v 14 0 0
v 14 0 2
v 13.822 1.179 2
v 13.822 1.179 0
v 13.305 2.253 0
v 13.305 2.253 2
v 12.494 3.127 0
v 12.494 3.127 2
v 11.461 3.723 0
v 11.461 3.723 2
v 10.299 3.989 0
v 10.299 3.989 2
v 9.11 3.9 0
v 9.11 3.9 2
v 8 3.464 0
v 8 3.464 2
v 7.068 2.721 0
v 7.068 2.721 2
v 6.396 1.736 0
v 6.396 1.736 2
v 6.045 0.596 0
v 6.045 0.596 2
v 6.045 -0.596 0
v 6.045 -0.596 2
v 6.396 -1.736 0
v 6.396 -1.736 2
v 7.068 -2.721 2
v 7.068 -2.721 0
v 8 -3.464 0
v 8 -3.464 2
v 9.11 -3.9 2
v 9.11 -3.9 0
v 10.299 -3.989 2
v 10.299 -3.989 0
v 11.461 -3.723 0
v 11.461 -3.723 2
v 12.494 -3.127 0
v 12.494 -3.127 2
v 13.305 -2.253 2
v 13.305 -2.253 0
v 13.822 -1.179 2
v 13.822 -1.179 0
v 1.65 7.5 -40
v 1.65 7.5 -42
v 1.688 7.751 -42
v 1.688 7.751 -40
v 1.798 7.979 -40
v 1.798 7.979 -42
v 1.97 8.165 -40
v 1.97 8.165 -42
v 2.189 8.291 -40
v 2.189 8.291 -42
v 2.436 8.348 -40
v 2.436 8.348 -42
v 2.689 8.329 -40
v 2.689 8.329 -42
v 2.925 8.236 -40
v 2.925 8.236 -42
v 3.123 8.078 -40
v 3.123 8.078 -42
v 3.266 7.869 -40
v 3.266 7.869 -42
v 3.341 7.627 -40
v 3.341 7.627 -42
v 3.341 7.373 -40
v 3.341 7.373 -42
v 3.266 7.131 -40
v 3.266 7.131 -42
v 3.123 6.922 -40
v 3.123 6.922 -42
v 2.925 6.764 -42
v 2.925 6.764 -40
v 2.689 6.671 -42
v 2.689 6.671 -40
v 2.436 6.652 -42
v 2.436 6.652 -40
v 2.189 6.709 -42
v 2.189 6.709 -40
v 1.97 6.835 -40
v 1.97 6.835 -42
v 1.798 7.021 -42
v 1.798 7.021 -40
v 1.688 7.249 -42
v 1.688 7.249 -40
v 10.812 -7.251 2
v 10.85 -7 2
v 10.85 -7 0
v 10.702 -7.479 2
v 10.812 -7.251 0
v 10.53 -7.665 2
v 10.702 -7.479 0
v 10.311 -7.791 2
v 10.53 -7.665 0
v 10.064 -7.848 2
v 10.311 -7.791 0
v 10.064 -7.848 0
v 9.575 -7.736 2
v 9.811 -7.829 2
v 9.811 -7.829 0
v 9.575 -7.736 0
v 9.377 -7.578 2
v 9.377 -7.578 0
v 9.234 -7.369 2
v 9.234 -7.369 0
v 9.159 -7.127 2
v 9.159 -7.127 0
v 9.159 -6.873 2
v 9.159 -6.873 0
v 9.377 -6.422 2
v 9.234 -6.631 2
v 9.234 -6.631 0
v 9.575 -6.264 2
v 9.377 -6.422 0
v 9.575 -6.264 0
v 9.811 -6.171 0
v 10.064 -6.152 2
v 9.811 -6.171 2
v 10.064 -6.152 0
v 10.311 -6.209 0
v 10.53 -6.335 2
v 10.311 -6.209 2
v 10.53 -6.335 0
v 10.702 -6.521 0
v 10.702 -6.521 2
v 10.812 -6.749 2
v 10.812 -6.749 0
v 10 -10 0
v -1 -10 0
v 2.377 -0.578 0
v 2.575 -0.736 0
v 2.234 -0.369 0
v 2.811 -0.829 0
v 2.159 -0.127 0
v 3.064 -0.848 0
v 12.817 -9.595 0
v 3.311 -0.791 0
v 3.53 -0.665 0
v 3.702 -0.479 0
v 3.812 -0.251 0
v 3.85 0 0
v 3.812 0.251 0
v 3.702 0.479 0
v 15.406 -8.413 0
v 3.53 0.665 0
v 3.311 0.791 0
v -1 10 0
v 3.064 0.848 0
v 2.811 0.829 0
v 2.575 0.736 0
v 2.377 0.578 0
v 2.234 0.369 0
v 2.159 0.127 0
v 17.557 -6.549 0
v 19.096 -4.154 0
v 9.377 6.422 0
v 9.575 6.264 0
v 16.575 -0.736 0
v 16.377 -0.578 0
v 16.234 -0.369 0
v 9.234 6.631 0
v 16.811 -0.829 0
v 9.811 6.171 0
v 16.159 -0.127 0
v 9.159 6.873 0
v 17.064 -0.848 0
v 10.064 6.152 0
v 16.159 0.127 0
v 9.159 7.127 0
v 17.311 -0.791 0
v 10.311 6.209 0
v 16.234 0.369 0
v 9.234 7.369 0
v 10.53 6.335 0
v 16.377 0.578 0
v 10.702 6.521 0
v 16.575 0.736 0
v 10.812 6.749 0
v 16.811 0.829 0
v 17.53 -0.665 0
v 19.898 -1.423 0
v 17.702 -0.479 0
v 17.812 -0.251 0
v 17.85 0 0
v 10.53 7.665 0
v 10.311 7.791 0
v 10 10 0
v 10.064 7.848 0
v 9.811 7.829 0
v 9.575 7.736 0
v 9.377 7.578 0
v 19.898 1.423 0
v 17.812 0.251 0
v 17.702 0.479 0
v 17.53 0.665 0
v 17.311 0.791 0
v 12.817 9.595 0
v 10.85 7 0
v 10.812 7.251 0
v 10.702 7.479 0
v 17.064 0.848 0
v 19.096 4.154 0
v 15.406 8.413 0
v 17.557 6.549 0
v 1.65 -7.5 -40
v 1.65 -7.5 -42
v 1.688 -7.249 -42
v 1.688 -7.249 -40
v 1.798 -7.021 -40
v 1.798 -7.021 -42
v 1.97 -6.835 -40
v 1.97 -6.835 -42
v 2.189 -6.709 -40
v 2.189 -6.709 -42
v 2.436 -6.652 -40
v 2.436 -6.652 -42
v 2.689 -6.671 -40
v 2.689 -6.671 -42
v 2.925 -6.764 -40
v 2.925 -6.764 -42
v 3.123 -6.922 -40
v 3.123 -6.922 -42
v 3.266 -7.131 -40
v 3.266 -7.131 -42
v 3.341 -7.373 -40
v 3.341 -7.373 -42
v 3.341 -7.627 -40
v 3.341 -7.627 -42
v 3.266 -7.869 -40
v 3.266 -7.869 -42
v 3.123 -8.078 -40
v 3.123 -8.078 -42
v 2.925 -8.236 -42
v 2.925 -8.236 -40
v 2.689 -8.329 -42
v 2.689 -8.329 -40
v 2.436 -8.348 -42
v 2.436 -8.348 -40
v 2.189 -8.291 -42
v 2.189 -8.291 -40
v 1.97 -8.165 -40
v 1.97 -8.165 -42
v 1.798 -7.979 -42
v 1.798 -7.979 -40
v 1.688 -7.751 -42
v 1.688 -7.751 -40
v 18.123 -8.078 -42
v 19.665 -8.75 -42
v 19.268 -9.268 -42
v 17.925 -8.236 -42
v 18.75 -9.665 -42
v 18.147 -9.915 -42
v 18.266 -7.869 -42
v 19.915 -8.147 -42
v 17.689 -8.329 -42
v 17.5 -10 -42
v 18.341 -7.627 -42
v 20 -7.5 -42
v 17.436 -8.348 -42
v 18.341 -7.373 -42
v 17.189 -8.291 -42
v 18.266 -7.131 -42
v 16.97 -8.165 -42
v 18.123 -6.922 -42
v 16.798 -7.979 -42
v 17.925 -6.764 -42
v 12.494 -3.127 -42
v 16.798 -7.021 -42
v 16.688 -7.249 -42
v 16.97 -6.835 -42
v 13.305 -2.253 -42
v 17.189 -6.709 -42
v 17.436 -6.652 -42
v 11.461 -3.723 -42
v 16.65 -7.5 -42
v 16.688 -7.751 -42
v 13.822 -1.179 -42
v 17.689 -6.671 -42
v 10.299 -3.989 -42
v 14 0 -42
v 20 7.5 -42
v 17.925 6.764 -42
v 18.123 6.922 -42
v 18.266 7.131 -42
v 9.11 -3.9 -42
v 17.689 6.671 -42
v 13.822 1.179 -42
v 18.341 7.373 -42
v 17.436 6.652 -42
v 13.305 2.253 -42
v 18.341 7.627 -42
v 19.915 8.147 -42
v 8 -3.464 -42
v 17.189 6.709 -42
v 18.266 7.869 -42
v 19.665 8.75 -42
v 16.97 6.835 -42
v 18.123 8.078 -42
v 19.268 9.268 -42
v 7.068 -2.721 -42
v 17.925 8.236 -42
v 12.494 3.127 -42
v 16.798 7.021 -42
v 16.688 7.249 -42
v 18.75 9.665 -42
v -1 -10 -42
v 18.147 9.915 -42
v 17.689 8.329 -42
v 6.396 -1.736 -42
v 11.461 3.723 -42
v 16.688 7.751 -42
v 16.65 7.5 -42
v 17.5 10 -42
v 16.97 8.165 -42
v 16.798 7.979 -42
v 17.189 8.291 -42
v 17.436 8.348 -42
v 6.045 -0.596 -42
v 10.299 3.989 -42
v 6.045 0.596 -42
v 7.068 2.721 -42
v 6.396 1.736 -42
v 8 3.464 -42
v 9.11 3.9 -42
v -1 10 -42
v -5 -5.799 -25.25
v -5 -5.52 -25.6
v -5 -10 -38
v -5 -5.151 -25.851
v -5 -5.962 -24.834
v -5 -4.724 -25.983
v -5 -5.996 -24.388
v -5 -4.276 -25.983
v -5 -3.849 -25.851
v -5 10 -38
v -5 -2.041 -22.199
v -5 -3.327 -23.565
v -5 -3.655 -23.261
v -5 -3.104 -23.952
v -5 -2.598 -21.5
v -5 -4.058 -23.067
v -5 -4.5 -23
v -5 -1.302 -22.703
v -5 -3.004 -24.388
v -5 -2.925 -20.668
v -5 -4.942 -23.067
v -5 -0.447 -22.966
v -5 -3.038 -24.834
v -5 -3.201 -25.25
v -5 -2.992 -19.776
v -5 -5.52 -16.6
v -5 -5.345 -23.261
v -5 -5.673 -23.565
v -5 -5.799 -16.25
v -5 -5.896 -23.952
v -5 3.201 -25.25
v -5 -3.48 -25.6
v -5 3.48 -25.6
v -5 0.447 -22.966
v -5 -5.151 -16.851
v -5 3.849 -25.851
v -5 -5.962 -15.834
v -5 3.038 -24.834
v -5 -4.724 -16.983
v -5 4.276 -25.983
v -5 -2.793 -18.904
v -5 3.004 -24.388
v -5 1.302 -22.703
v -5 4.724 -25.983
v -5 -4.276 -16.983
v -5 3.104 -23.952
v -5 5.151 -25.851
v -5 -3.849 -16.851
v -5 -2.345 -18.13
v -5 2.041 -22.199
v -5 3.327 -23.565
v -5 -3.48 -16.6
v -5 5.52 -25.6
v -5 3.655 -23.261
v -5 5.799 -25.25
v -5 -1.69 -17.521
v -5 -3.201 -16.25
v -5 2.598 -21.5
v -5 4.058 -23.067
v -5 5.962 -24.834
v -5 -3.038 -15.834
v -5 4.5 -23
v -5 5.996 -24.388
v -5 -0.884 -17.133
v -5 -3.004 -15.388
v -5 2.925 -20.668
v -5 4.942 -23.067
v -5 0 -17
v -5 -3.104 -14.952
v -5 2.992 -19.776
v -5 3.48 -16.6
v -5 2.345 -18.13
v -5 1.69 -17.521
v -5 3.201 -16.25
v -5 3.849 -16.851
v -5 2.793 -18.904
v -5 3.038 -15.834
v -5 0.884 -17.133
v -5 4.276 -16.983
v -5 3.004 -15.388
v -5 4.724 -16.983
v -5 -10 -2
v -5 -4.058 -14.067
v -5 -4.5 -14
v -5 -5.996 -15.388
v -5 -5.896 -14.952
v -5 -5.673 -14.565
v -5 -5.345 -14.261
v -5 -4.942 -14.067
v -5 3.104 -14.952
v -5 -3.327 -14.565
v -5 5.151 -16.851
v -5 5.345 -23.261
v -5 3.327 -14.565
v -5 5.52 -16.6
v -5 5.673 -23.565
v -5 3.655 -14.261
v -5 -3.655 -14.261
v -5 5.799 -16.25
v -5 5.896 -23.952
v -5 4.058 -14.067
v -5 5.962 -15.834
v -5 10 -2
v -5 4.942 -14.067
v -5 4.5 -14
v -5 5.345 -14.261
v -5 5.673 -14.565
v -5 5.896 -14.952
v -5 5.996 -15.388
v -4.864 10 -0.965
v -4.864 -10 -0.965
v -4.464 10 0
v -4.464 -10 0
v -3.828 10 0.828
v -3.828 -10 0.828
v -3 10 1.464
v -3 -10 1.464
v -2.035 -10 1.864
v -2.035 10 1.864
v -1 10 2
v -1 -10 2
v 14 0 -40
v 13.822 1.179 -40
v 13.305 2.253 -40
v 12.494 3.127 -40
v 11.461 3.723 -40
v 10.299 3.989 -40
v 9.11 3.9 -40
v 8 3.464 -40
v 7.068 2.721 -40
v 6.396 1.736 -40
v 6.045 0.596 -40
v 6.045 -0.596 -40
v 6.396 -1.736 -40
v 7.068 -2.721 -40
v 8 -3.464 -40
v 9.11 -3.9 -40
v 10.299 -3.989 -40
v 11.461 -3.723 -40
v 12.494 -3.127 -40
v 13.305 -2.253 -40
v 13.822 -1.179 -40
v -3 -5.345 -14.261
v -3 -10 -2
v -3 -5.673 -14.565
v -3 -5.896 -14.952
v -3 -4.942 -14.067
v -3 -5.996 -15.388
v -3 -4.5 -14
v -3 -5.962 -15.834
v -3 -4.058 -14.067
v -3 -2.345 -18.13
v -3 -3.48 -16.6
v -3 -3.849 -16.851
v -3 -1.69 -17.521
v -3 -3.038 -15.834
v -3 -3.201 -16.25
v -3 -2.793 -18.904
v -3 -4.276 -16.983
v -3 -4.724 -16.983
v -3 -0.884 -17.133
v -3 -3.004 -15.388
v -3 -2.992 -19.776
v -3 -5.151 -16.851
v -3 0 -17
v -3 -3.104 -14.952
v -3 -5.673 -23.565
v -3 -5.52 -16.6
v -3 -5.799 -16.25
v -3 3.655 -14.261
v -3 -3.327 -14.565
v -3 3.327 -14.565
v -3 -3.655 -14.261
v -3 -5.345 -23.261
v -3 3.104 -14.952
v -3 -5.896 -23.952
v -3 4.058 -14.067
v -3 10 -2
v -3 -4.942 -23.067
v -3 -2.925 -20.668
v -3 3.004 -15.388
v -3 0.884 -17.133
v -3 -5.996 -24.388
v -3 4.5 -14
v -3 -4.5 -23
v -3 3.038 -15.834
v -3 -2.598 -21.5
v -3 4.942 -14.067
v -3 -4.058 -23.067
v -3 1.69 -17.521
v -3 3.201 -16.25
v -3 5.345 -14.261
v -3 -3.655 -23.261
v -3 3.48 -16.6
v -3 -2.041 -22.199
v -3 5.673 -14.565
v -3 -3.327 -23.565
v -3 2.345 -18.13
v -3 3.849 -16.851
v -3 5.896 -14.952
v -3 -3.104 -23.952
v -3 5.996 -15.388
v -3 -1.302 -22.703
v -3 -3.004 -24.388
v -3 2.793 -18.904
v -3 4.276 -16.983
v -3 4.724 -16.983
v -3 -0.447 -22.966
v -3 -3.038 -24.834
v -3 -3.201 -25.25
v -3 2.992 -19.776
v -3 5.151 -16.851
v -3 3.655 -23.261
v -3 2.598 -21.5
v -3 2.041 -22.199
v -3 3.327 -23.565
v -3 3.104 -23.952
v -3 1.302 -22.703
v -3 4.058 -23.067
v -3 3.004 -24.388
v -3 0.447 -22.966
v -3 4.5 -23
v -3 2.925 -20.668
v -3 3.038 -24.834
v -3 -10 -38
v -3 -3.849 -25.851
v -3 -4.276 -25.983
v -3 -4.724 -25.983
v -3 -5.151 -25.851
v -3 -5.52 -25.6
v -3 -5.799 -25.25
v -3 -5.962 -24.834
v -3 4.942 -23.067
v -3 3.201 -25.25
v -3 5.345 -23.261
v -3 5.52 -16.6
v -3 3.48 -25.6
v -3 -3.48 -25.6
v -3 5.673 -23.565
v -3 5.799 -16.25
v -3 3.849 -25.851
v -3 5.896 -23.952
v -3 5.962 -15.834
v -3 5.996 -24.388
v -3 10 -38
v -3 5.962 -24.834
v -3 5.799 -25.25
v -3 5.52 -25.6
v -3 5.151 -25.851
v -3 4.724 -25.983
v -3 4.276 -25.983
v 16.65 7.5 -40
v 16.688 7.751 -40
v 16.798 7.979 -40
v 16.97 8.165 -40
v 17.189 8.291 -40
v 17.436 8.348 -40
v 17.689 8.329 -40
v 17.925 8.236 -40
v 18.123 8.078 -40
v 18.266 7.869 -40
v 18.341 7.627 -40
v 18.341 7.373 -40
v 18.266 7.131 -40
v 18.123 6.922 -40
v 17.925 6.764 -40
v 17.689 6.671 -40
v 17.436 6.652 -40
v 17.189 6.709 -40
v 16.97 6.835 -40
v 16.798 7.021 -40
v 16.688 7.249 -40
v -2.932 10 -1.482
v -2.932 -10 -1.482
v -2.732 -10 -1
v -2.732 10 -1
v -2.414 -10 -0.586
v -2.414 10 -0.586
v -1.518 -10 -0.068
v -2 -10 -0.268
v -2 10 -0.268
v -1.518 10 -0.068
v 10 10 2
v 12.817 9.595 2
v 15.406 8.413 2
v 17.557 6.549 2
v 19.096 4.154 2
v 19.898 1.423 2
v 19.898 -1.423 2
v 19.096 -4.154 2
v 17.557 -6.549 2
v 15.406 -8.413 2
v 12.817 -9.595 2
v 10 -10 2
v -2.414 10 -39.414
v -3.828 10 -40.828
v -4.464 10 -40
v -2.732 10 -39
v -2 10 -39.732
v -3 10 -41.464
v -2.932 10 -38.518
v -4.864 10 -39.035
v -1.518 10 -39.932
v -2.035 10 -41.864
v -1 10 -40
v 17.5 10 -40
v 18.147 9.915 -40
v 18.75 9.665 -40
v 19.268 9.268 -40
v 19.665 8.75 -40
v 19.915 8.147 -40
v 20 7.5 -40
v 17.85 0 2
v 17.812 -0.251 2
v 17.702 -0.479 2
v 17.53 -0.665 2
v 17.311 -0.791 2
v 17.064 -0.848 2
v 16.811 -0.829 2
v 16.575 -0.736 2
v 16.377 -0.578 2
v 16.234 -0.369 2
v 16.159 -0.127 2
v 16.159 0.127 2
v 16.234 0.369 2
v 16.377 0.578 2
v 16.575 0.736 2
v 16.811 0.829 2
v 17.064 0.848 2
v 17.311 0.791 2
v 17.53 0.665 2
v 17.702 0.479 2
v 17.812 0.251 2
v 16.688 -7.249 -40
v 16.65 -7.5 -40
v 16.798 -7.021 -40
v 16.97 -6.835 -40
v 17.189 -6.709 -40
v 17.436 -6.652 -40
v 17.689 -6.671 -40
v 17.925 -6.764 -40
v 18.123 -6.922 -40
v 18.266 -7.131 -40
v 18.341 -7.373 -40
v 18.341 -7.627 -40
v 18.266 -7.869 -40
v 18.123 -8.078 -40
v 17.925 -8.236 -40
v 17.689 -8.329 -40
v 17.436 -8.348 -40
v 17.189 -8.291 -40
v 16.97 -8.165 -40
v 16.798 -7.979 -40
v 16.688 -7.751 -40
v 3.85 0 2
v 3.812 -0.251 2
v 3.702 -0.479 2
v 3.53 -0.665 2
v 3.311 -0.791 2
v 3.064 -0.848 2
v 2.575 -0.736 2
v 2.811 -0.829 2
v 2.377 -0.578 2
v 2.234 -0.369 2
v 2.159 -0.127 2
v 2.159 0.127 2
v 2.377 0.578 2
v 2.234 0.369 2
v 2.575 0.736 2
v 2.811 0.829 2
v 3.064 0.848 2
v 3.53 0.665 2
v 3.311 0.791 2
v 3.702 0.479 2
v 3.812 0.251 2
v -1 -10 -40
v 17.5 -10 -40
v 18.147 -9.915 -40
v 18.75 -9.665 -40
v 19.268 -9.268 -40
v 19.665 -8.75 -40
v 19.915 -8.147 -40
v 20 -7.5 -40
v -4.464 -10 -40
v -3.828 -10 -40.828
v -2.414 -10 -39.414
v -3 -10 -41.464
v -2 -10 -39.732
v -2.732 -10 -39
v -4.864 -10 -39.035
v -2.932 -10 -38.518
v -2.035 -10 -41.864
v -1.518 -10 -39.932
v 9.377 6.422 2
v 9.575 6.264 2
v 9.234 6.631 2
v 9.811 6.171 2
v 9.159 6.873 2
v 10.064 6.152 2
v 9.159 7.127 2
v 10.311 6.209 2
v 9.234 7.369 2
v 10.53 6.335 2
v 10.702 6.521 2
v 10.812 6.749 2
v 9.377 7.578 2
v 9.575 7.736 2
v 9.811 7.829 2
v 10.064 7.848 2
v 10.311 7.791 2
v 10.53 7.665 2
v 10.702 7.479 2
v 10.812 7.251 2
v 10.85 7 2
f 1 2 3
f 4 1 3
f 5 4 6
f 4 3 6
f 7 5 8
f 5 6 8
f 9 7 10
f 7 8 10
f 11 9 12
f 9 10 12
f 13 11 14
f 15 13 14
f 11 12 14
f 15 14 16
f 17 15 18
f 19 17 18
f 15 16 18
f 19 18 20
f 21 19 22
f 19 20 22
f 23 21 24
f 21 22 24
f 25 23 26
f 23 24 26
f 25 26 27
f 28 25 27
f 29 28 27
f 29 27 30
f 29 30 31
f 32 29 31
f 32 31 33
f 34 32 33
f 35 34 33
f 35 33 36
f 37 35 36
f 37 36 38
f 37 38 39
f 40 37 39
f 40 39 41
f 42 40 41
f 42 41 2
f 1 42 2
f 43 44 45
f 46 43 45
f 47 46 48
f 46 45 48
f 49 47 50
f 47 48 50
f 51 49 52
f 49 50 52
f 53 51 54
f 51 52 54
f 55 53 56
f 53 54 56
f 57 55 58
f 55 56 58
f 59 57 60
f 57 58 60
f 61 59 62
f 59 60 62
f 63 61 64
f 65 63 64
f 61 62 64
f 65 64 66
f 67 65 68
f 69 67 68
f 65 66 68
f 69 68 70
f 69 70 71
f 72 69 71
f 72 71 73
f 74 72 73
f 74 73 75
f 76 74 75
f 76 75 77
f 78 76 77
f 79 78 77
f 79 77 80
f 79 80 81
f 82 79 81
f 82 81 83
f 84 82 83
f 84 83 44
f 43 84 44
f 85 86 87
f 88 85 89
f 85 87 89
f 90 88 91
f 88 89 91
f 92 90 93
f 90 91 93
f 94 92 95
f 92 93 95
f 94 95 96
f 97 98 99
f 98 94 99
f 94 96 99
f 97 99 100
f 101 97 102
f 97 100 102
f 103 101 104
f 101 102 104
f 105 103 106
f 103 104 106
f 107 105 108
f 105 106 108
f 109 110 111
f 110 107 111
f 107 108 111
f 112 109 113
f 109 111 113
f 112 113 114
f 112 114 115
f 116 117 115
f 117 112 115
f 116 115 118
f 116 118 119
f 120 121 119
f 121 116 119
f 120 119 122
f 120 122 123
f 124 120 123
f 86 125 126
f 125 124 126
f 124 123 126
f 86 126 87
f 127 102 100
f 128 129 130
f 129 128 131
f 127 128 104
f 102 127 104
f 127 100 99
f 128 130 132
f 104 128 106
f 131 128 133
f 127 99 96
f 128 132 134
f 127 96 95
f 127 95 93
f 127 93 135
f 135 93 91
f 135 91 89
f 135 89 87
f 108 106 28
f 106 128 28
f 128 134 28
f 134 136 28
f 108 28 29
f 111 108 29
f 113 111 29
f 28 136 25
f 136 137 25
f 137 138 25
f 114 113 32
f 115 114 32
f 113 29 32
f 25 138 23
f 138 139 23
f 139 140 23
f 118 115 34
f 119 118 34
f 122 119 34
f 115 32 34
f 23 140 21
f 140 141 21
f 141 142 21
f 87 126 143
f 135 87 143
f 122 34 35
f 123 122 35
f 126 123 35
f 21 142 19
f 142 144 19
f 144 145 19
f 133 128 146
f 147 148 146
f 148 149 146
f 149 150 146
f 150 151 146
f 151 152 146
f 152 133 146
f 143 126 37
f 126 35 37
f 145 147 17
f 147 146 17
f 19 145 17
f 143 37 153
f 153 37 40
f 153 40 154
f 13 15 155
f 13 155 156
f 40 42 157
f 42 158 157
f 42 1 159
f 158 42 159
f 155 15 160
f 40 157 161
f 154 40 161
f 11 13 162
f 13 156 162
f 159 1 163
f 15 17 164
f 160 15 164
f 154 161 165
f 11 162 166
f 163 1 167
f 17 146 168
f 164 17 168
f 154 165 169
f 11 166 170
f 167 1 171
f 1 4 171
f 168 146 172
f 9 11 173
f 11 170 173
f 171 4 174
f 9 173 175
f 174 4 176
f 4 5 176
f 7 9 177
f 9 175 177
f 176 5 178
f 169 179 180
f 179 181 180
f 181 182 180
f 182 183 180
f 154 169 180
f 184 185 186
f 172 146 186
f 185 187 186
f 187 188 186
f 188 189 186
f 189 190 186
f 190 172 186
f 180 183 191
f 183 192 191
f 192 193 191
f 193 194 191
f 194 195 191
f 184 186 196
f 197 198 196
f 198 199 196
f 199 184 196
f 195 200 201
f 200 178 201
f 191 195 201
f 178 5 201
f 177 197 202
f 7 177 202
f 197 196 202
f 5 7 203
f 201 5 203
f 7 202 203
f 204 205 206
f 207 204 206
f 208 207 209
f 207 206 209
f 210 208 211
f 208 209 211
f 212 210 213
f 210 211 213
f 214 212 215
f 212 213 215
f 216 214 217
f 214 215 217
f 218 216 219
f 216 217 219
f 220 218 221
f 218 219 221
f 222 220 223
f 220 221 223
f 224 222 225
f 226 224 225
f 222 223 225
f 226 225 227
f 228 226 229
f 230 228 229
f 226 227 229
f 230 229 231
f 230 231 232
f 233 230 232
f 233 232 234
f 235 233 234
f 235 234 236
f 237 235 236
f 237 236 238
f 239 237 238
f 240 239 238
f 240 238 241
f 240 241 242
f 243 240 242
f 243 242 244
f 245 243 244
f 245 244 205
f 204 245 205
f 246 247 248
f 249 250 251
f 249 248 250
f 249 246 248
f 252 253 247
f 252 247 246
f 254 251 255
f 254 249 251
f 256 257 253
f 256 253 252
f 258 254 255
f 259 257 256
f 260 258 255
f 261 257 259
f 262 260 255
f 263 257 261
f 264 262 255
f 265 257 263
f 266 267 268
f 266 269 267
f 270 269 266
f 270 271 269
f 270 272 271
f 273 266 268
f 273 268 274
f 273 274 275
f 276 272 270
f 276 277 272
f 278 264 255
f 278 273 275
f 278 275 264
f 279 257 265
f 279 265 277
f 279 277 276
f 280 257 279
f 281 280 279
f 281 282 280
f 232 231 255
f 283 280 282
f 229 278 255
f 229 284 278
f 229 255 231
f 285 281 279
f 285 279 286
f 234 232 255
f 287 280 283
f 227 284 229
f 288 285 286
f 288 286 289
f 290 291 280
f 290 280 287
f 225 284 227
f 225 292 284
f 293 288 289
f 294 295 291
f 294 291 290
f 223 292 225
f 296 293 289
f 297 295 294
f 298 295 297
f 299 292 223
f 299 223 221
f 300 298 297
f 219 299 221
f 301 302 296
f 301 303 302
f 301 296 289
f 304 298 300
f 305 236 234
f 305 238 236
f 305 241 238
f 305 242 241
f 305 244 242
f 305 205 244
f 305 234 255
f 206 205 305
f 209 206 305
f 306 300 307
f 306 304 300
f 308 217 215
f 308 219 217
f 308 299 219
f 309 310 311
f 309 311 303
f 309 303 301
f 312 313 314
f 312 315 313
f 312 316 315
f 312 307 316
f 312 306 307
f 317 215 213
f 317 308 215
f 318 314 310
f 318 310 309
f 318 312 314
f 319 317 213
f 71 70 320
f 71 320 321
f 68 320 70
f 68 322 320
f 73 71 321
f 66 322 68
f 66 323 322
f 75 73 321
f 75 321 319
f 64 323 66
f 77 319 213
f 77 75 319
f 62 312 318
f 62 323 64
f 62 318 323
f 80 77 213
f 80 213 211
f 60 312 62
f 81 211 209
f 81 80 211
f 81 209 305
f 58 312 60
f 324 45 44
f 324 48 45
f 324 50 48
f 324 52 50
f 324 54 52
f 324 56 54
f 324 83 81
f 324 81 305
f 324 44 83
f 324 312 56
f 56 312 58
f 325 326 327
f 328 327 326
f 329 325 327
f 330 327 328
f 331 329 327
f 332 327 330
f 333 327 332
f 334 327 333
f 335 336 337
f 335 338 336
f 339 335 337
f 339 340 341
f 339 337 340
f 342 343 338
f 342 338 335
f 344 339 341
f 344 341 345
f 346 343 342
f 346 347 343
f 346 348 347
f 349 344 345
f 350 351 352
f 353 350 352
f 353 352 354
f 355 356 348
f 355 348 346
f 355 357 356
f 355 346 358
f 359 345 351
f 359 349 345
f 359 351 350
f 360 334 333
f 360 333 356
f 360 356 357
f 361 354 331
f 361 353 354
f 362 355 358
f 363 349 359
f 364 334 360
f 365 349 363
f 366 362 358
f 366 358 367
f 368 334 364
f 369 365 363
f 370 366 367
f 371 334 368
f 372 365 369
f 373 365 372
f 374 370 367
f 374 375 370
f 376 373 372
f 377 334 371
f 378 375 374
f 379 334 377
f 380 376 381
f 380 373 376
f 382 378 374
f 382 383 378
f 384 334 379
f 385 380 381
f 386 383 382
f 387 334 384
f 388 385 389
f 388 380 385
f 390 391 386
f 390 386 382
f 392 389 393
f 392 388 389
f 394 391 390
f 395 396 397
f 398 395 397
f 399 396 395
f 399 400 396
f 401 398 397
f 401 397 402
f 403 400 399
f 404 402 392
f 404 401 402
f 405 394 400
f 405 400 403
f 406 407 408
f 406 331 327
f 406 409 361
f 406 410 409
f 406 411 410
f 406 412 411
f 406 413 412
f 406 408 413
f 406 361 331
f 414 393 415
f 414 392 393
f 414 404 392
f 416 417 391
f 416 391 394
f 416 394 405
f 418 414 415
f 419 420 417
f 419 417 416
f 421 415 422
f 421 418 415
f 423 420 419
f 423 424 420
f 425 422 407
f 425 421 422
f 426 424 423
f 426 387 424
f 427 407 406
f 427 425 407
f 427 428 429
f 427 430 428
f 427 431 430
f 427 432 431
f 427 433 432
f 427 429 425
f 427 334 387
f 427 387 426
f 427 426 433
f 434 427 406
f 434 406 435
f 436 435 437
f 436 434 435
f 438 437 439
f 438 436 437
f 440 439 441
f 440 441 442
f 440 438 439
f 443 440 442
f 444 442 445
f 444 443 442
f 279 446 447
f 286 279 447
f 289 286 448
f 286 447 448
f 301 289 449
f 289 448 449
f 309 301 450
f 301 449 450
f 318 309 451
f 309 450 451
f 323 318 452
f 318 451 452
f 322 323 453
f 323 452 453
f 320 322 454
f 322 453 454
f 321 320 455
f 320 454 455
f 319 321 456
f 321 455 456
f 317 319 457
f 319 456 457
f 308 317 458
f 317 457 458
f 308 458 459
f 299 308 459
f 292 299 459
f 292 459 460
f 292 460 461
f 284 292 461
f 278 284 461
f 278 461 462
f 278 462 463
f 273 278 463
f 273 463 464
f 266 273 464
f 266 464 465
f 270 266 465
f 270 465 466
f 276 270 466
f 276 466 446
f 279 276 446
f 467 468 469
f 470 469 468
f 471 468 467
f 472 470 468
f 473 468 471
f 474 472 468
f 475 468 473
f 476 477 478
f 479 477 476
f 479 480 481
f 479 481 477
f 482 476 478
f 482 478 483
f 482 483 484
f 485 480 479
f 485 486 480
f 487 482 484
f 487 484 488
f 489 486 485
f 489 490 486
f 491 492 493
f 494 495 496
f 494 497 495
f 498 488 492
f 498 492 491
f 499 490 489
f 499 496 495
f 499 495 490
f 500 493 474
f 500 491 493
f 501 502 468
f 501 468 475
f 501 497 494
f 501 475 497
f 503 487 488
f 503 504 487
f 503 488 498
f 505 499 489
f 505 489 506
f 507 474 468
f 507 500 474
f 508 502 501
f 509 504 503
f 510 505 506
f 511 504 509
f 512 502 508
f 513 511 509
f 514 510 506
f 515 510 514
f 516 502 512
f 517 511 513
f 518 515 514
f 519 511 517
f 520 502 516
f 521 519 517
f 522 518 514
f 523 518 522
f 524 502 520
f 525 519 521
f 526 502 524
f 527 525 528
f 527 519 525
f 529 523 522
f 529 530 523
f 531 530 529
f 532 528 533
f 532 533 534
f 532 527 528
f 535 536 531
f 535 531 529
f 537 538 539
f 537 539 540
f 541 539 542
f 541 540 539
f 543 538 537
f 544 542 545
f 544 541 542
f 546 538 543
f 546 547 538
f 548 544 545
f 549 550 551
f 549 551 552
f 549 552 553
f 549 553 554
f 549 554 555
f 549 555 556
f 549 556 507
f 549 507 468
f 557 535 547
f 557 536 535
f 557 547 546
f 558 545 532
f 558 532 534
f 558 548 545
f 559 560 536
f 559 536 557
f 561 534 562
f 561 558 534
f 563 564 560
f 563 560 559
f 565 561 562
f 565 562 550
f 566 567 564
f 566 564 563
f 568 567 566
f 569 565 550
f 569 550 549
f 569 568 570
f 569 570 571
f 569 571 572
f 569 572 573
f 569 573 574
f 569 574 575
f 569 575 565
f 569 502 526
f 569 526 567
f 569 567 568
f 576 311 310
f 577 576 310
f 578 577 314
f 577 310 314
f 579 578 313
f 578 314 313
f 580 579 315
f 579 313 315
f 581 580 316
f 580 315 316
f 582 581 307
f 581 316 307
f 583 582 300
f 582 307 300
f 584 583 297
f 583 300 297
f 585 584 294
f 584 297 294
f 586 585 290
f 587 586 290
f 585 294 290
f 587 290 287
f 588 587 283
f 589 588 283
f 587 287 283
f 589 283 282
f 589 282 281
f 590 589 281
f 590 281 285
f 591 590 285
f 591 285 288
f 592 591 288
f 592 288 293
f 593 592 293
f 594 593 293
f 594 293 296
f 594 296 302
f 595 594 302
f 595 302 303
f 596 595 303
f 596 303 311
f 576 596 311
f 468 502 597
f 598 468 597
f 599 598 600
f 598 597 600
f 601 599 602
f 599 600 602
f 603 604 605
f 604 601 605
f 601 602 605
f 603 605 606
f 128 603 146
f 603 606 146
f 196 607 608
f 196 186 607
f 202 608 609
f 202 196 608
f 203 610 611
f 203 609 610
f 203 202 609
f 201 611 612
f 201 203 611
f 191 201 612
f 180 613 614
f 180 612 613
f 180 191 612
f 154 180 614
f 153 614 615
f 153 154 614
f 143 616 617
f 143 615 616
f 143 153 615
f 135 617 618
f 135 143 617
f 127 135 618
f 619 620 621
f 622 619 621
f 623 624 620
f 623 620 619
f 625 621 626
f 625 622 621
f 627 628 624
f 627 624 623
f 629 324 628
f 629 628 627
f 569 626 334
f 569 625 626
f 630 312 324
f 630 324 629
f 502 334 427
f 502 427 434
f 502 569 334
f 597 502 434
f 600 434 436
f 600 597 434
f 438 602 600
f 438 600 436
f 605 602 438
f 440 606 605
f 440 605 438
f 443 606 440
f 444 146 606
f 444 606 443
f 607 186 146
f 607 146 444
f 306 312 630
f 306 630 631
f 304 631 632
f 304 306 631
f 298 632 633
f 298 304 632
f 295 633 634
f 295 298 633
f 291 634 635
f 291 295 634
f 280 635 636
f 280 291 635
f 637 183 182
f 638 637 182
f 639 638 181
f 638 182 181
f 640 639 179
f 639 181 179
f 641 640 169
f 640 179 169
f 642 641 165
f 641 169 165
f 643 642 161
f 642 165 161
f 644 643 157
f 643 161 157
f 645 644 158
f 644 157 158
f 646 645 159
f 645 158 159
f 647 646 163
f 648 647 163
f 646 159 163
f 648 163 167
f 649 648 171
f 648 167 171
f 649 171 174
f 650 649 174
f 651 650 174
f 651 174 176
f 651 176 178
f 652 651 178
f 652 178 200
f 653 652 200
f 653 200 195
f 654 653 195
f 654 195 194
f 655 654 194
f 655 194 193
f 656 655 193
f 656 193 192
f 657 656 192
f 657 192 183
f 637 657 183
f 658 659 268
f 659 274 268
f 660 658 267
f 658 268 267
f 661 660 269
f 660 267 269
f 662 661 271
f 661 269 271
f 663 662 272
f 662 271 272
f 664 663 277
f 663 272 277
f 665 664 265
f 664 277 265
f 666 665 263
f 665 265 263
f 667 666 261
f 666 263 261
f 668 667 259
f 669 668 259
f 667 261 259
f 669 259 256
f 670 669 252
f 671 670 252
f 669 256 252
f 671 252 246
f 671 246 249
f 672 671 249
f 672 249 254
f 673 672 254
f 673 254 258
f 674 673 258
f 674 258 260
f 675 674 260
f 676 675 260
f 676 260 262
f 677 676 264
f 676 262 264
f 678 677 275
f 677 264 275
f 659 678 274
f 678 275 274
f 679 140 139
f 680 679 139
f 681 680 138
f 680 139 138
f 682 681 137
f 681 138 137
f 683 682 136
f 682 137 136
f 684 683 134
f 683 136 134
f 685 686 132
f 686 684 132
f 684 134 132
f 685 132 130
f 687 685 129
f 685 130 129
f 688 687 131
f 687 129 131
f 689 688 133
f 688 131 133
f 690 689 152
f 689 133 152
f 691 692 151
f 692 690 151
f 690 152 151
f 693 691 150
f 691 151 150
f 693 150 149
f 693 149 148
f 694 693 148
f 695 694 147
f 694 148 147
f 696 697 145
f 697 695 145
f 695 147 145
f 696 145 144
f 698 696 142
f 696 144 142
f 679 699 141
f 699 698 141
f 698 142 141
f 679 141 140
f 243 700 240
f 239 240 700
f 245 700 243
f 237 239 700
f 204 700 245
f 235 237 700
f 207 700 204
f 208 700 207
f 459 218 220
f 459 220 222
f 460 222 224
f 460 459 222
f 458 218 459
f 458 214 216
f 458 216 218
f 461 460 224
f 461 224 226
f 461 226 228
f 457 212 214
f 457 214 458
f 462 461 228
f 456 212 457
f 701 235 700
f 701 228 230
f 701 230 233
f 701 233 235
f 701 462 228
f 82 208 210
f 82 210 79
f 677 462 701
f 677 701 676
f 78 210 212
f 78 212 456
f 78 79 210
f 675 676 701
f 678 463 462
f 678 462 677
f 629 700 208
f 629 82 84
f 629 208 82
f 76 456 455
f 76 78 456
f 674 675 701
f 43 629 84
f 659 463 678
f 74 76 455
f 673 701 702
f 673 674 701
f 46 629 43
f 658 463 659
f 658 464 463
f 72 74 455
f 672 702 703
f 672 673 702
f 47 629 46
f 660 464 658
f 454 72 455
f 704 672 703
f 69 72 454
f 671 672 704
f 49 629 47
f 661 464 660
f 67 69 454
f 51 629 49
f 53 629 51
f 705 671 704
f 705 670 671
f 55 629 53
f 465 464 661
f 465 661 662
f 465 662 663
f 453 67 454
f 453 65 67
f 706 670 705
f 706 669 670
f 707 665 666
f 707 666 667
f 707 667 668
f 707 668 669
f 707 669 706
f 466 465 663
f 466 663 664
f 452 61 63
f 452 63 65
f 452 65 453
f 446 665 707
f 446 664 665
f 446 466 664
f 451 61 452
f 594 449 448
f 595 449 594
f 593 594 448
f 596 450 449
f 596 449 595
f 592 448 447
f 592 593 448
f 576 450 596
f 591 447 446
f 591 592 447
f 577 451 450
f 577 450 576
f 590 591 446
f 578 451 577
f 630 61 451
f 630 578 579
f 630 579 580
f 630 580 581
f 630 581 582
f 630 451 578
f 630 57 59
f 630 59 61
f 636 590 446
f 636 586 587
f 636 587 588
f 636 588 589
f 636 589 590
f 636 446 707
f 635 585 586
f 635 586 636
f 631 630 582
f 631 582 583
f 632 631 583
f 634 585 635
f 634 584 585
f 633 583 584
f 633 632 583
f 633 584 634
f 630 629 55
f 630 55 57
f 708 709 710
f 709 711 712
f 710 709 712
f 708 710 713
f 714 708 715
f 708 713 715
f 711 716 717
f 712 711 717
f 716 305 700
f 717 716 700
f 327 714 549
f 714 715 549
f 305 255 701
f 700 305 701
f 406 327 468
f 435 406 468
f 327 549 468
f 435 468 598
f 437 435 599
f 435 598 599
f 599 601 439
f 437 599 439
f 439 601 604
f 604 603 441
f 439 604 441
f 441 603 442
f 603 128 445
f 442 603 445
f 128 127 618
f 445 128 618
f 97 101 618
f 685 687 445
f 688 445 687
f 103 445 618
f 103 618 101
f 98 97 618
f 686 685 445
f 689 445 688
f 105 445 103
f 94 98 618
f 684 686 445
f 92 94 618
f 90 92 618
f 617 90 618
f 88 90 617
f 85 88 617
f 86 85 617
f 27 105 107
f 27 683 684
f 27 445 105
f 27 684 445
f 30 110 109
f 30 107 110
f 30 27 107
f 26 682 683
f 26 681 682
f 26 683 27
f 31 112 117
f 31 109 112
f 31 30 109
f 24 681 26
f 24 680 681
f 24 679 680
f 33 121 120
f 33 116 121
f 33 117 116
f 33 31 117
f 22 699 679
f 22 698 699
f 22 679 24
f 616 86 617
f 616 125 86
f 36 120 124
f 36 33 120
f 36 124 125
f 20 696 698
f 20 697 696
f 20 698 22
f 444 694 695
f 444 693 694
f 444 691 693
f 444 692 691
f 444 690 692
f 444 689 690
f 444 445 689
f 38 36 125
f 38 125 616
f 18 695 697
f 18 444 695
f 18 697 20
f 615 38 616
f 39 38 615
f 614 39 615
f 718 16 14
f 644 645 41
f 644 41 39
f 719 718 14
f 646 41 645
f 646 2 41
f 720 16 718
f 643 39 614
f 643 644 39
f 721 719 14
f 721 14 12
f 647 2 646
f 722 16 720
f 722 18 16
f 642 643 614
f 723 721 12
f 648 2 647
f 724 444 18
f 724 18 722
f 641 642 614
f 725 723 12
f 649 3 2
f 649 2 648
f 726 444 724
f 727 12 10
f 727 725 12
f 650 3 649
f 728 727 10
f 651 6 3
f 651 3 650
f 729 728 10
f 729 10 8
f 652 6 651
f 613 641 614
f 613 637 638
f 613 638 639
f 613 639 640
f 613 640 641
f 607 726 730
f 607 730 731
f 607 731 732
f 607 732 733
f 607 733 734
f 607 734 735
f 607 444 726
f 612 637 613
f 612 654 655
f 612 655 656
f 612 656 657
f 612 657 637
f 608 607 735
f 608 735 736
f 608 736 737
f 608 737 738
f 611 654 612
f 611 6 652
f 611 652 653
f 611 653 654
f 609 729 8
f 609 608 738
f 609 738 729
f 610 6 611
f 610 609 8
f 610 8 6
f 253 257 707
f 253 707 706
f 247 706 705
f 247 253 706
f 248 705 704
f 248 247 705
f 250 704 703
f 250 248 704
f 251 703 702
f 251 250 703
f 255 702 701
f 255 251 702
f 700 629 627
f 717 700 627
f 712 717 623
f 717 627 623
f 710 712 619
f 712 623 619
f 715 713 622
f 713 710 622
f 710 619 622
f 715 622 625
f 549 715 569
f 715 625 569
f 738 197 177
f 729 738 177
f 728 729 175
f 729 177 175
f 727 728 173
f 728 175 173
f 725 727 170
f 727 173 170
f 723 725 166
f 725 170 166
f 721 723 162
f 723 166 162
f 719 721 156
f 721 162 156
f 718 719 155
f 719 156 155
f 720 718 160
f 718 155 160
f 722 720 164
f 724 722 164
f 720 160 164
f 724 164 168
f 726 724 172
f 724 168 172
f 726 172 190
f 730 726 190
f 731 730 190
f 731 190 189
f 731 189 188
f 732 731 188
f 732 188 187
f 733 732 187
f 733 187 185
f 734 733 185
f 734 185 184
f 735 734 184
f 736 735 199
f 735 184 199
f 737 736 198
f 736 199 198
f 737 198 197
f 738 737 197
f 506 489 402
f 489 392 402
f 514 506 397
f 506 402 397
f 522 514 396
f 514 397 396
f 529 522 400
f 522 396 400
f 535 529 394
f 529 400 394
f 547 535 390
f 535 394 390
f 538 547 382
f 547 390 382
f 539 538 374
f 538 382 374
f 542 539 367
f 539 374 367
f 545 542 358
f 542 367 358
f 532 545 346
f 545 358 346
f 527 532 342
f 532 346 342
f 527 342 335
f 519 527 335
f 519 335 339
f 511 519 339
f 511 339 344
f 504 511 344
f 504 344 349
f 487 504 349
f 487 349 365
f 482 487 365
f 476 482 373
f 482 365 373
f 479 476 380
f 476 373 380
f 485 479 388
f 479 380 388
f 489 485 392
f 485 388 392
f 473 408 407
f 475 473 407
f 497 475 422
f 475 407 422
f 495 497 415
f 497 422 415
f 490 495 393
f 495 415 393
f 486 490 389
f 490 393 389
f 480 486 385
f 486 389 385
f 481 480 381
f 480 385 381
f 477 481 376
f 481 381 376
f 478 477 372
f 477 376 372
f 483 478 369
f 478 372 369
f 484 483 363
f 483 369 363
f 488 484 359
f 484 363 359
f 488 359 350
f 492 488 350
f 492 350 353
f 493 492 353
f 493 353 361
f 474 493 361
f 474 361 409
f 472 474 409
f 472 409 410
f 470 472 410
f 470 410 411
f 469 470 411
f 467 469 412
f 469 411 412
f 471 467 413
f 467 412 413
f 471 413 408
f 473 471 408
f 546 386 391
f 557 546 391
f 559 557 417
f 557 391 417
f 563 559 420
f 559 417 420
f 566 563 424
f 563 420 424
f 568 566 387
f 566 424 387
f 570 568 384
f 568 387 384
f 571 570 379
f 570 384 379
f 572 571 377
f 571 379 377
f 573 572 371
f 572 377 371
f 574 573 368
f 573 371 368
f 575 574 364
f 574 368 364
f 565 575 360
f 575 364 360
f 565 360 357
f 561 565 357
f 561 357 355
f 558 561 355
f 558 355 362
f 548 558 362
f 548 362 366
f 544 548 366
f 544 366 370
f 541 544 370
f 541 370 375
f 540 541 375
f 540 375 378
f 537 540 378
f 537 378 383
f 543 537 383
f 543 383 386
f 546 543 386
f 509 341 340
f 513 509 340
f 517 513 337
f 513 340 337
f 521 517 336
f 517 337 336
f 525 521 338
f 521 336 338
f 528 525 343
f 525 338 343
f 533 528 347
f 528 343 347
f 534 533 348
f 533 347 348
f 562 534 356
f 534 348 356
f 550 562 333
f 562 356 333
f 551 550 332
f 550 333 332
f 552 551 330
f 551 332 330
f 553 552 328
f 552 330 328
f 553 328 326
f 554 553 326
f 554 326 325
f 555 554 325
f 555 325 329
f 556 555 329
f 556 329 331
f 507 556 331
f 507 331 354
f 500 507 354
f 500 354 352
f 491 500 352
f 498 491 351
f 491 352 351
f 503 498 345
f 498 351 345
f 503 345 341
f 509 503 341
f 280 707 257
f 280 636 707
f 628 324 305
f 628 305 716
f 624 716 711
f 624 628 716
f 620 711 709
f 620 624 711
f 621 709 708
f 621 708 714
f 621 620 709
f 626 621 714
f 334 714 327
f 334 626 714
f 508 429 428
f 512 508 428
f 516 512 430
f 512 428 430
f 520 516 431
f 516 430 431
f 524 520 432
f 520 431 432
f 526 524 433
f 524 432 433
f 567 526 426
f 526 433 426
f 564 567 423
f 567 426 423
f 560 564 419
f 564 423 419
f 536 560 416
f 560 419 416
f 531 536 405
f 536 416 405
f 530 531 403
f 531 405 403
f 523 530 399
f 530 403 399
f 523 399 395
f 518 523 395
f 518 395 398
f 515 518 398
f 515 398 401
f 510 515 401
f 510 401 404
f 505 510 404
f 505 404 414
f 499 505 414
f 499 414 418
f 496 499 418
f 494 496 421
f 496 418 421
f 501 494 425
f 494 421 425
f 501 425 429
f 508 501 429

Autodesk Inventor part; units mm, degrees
ref_plane "YZ Plane" through (0, 0, 0) normal (1, 0, 0) x (0, 1, 0)
ref_plane "XZ Plane" through (0, 0, 0) normal (0, 1, 0) x (-1, 0, 0)
ref_plane "XY Plane" through (0, 0, 0) normal (0, 0, 1) x (1, 0, 0)
sketch "Sketch1" plane through (0, 0, 0) normal (0, 0, 1) x (1, 0, 0)
  line L0 (2.5, 10) -> (37.5, 10) construction
  line L1 (0, -7.5) -> (0, 7.5) construction
  line L2 (37.5, -10) -> (2.5, -10) construction
  circle A0 centre (10, -7) radius 0.85
  circle A1 centre (10, 7) radius 0.85
  circle A2 centre (3, 0) radius 0.85
  circle A3 centre (10, 0) radius 10
  line L3 (10, 7) -> (10, -7) construction
  circle A4 centre (17, 0) radius 0.85
  line L4 (10, 10) -> (-5, 10)
  line L5 (-5, 10) -> (-5, -10)
  line L6 (-5, -10) -> (10, -10)
  line L7 (10, -10) -> (10, 10)
  line L8 (10, 0) -> (20, 0)
  point P0 (0, 0)
  dimension "d0" = 25
extrude "Plate1" add sketch "Sketch1" along normal blind 2 contours A0 L7 L8 A4 A3 | A0 L7 A3 A1 | L7 A1 A3 L8 A4 | L6 L5 L4 A3
sketch "Sketch2" plane through (-3, 10, 2) normal (-1, 0, 0) x (0, -1, 0)
  line L0 (20, 0) -> (0, 0)
  line L1 (0, 0) -> (0, -44)
  line L2 (0, -44) -> (20, -44)
  line L3 (20, -44) -> (20, 0)
edge flange "Flange1" height 44 angle 90 thickness 2 bend radius 2 thickness toward (-1, 0, 0) relief tear relief width 2 relief depth 1 edges at (-5, 0, 0) wall of the first edge with corners at (-3, -10, 2) (-3, 10, 2) (-3, 10, -42) (-3, -10, -42)
bend "Bend1"
corner "Corner1"
sketch "Sketch3" plane through (-5, 10, -40) normal (0, 0, -1) x (-1, 0, 0)
  line L0 (0, -20) -> (0, 0)
  line L1 (0, 0) -> (-25, 0)
  line L2 (-25, 0) -> (-25, -20)
  line L3 (-25, -20) -> (0, -20)
edge flange "Flange2" height 25 angle 90 thickness 2 bend radius 2 thickness toward (0, 0, -1) relief tear relief width 2 relief depth 1 edges at (-3, 0, -42) wall of the first edge with corners at (-5, -10, -40) (-5, 10, -40) (20, 10, -40) (20, -10, -40)
bend "Bend2"
corner "Corner2"
fillet "Fillet1" radius 2.5 2 edges at (20, 10, -41) (20, -10, -41)
sketch "Sketch4" plane through (-1, -10, -42) normal (0, 0, -1) x (-1, 0, 0)
  circle A0 centre (-18.5, 2.5) radius 0.85 projected
  circle A1 centre (-18.5, 17.5) radius 0.85 projected
  circle A2 centre (-3.5, 17.5) radius 0.85 projected
  circle A3 centre (-3.5, 2.5) radius 0.85 projected
  point P0 (-1, 10)
extrude "Cut1" cut sketch "Sketch4" against normal blind 2
sketch "Sketch5" plane through (-5, -10, -2) normal (-1, 0, 0) x (0, 0, 1)
  line L0 (-36, 20) -> (0, 20) construction
  line L1 (-18, 20) -> (-18, 0) construction
  line L2 (0, 0) -> (-36, 0) construction
  circle A0 centre (-18, 10) radius 3
  line L3 (-22.5, 14.5) -> (-13.5, 14.5) construction
  line L4 (-13.5, 14.5) -> (-13.5, 5.5) construction
  line L5 (-13.5, 5.5) -> (-22.5, 5.5) construction
  line L6 (-22.5, 5.5) -> (-22.5, 14.5) construction
  line L7 (-22.5, 14.5) -> (-13.5, 5.5) construction
  circle A1 centre (-13.5, 14.5) radius 1.5
  circle A2 centre (-22.5, 14.5) radius 1.5
  circle A3 centre (-22.5, 5.5) radius 1.5
  circle A4 centre (-13.5, 5.5) radius 1.5
  point P0 (2, 10)
  dimension "d25" = 6
  dimension "d26" = 9
  dimension "d27" = 3
extrude "Cut2" cut sketch "Sketch5" against normal blind 2
sketch "Sketch6" plane through (0, 0, 2) normal (0, 0, 1) x (1, 0, 0)
  arc A0 (10, -10) -> (10, 10) centre (10, 0) ccw construction
  circle A1 centre (10, 0) radius 4
  point P0 (0, 0)
  dimension "d30" = 8
extrude "Cut3" cut sketch "Sketch6" against normal through all
equation "\"d23\" = Thickness"
equation "\"d28\" = Thickness"
equation "\"d31\" = Thickness"
equation "\"d1\" = Thickness"
equation "\"d2\" = BendReliefWidth"
equation "\"d3\" = BendReliefDepth"
equation "\"d4\" = MinimumRemnant"
equation "\"d5\" = TransitionRadius"
equation "\"d8\" = BendRadius"
equation "\"d9\" = CornerReliefSize"
equation "\"d10\" = GapSize"
equation "\"d11\" = JacobiRadiusSize"
equation "\"d12\" = BendReliefWidth"
equation "\"d13\" = BendReliefDepth"
equation "\"d14\" = MinimumRemnant"
equation "\"d15\" = TransitionRadius"
equation "\"d18\" = BendRadius"
equation "\"d19\" = CornerReliefSize"
equation "\"d20\" = GapSize"
equation "\"d21\" = JacobiRadiusSize"
equation "\"BendRadius\" = Thickness"
equation "\"BendReliefWidth\" = Thickness"
equation "\"BendReliefDepth\" = 0.5 * Thickness"
equation "\"CornerReliefSize\" = 4 * Thickness"
equation "\"MinimumRemnant\" = 2 * Thickness"
equation "\"TransitionRadius\" = BendRadius"
equation "\"JacobiRadiusSize\" = BendRadius"
equation "\"GapSize\" = Thickness"
equation "\"Thickness\" = 2"
